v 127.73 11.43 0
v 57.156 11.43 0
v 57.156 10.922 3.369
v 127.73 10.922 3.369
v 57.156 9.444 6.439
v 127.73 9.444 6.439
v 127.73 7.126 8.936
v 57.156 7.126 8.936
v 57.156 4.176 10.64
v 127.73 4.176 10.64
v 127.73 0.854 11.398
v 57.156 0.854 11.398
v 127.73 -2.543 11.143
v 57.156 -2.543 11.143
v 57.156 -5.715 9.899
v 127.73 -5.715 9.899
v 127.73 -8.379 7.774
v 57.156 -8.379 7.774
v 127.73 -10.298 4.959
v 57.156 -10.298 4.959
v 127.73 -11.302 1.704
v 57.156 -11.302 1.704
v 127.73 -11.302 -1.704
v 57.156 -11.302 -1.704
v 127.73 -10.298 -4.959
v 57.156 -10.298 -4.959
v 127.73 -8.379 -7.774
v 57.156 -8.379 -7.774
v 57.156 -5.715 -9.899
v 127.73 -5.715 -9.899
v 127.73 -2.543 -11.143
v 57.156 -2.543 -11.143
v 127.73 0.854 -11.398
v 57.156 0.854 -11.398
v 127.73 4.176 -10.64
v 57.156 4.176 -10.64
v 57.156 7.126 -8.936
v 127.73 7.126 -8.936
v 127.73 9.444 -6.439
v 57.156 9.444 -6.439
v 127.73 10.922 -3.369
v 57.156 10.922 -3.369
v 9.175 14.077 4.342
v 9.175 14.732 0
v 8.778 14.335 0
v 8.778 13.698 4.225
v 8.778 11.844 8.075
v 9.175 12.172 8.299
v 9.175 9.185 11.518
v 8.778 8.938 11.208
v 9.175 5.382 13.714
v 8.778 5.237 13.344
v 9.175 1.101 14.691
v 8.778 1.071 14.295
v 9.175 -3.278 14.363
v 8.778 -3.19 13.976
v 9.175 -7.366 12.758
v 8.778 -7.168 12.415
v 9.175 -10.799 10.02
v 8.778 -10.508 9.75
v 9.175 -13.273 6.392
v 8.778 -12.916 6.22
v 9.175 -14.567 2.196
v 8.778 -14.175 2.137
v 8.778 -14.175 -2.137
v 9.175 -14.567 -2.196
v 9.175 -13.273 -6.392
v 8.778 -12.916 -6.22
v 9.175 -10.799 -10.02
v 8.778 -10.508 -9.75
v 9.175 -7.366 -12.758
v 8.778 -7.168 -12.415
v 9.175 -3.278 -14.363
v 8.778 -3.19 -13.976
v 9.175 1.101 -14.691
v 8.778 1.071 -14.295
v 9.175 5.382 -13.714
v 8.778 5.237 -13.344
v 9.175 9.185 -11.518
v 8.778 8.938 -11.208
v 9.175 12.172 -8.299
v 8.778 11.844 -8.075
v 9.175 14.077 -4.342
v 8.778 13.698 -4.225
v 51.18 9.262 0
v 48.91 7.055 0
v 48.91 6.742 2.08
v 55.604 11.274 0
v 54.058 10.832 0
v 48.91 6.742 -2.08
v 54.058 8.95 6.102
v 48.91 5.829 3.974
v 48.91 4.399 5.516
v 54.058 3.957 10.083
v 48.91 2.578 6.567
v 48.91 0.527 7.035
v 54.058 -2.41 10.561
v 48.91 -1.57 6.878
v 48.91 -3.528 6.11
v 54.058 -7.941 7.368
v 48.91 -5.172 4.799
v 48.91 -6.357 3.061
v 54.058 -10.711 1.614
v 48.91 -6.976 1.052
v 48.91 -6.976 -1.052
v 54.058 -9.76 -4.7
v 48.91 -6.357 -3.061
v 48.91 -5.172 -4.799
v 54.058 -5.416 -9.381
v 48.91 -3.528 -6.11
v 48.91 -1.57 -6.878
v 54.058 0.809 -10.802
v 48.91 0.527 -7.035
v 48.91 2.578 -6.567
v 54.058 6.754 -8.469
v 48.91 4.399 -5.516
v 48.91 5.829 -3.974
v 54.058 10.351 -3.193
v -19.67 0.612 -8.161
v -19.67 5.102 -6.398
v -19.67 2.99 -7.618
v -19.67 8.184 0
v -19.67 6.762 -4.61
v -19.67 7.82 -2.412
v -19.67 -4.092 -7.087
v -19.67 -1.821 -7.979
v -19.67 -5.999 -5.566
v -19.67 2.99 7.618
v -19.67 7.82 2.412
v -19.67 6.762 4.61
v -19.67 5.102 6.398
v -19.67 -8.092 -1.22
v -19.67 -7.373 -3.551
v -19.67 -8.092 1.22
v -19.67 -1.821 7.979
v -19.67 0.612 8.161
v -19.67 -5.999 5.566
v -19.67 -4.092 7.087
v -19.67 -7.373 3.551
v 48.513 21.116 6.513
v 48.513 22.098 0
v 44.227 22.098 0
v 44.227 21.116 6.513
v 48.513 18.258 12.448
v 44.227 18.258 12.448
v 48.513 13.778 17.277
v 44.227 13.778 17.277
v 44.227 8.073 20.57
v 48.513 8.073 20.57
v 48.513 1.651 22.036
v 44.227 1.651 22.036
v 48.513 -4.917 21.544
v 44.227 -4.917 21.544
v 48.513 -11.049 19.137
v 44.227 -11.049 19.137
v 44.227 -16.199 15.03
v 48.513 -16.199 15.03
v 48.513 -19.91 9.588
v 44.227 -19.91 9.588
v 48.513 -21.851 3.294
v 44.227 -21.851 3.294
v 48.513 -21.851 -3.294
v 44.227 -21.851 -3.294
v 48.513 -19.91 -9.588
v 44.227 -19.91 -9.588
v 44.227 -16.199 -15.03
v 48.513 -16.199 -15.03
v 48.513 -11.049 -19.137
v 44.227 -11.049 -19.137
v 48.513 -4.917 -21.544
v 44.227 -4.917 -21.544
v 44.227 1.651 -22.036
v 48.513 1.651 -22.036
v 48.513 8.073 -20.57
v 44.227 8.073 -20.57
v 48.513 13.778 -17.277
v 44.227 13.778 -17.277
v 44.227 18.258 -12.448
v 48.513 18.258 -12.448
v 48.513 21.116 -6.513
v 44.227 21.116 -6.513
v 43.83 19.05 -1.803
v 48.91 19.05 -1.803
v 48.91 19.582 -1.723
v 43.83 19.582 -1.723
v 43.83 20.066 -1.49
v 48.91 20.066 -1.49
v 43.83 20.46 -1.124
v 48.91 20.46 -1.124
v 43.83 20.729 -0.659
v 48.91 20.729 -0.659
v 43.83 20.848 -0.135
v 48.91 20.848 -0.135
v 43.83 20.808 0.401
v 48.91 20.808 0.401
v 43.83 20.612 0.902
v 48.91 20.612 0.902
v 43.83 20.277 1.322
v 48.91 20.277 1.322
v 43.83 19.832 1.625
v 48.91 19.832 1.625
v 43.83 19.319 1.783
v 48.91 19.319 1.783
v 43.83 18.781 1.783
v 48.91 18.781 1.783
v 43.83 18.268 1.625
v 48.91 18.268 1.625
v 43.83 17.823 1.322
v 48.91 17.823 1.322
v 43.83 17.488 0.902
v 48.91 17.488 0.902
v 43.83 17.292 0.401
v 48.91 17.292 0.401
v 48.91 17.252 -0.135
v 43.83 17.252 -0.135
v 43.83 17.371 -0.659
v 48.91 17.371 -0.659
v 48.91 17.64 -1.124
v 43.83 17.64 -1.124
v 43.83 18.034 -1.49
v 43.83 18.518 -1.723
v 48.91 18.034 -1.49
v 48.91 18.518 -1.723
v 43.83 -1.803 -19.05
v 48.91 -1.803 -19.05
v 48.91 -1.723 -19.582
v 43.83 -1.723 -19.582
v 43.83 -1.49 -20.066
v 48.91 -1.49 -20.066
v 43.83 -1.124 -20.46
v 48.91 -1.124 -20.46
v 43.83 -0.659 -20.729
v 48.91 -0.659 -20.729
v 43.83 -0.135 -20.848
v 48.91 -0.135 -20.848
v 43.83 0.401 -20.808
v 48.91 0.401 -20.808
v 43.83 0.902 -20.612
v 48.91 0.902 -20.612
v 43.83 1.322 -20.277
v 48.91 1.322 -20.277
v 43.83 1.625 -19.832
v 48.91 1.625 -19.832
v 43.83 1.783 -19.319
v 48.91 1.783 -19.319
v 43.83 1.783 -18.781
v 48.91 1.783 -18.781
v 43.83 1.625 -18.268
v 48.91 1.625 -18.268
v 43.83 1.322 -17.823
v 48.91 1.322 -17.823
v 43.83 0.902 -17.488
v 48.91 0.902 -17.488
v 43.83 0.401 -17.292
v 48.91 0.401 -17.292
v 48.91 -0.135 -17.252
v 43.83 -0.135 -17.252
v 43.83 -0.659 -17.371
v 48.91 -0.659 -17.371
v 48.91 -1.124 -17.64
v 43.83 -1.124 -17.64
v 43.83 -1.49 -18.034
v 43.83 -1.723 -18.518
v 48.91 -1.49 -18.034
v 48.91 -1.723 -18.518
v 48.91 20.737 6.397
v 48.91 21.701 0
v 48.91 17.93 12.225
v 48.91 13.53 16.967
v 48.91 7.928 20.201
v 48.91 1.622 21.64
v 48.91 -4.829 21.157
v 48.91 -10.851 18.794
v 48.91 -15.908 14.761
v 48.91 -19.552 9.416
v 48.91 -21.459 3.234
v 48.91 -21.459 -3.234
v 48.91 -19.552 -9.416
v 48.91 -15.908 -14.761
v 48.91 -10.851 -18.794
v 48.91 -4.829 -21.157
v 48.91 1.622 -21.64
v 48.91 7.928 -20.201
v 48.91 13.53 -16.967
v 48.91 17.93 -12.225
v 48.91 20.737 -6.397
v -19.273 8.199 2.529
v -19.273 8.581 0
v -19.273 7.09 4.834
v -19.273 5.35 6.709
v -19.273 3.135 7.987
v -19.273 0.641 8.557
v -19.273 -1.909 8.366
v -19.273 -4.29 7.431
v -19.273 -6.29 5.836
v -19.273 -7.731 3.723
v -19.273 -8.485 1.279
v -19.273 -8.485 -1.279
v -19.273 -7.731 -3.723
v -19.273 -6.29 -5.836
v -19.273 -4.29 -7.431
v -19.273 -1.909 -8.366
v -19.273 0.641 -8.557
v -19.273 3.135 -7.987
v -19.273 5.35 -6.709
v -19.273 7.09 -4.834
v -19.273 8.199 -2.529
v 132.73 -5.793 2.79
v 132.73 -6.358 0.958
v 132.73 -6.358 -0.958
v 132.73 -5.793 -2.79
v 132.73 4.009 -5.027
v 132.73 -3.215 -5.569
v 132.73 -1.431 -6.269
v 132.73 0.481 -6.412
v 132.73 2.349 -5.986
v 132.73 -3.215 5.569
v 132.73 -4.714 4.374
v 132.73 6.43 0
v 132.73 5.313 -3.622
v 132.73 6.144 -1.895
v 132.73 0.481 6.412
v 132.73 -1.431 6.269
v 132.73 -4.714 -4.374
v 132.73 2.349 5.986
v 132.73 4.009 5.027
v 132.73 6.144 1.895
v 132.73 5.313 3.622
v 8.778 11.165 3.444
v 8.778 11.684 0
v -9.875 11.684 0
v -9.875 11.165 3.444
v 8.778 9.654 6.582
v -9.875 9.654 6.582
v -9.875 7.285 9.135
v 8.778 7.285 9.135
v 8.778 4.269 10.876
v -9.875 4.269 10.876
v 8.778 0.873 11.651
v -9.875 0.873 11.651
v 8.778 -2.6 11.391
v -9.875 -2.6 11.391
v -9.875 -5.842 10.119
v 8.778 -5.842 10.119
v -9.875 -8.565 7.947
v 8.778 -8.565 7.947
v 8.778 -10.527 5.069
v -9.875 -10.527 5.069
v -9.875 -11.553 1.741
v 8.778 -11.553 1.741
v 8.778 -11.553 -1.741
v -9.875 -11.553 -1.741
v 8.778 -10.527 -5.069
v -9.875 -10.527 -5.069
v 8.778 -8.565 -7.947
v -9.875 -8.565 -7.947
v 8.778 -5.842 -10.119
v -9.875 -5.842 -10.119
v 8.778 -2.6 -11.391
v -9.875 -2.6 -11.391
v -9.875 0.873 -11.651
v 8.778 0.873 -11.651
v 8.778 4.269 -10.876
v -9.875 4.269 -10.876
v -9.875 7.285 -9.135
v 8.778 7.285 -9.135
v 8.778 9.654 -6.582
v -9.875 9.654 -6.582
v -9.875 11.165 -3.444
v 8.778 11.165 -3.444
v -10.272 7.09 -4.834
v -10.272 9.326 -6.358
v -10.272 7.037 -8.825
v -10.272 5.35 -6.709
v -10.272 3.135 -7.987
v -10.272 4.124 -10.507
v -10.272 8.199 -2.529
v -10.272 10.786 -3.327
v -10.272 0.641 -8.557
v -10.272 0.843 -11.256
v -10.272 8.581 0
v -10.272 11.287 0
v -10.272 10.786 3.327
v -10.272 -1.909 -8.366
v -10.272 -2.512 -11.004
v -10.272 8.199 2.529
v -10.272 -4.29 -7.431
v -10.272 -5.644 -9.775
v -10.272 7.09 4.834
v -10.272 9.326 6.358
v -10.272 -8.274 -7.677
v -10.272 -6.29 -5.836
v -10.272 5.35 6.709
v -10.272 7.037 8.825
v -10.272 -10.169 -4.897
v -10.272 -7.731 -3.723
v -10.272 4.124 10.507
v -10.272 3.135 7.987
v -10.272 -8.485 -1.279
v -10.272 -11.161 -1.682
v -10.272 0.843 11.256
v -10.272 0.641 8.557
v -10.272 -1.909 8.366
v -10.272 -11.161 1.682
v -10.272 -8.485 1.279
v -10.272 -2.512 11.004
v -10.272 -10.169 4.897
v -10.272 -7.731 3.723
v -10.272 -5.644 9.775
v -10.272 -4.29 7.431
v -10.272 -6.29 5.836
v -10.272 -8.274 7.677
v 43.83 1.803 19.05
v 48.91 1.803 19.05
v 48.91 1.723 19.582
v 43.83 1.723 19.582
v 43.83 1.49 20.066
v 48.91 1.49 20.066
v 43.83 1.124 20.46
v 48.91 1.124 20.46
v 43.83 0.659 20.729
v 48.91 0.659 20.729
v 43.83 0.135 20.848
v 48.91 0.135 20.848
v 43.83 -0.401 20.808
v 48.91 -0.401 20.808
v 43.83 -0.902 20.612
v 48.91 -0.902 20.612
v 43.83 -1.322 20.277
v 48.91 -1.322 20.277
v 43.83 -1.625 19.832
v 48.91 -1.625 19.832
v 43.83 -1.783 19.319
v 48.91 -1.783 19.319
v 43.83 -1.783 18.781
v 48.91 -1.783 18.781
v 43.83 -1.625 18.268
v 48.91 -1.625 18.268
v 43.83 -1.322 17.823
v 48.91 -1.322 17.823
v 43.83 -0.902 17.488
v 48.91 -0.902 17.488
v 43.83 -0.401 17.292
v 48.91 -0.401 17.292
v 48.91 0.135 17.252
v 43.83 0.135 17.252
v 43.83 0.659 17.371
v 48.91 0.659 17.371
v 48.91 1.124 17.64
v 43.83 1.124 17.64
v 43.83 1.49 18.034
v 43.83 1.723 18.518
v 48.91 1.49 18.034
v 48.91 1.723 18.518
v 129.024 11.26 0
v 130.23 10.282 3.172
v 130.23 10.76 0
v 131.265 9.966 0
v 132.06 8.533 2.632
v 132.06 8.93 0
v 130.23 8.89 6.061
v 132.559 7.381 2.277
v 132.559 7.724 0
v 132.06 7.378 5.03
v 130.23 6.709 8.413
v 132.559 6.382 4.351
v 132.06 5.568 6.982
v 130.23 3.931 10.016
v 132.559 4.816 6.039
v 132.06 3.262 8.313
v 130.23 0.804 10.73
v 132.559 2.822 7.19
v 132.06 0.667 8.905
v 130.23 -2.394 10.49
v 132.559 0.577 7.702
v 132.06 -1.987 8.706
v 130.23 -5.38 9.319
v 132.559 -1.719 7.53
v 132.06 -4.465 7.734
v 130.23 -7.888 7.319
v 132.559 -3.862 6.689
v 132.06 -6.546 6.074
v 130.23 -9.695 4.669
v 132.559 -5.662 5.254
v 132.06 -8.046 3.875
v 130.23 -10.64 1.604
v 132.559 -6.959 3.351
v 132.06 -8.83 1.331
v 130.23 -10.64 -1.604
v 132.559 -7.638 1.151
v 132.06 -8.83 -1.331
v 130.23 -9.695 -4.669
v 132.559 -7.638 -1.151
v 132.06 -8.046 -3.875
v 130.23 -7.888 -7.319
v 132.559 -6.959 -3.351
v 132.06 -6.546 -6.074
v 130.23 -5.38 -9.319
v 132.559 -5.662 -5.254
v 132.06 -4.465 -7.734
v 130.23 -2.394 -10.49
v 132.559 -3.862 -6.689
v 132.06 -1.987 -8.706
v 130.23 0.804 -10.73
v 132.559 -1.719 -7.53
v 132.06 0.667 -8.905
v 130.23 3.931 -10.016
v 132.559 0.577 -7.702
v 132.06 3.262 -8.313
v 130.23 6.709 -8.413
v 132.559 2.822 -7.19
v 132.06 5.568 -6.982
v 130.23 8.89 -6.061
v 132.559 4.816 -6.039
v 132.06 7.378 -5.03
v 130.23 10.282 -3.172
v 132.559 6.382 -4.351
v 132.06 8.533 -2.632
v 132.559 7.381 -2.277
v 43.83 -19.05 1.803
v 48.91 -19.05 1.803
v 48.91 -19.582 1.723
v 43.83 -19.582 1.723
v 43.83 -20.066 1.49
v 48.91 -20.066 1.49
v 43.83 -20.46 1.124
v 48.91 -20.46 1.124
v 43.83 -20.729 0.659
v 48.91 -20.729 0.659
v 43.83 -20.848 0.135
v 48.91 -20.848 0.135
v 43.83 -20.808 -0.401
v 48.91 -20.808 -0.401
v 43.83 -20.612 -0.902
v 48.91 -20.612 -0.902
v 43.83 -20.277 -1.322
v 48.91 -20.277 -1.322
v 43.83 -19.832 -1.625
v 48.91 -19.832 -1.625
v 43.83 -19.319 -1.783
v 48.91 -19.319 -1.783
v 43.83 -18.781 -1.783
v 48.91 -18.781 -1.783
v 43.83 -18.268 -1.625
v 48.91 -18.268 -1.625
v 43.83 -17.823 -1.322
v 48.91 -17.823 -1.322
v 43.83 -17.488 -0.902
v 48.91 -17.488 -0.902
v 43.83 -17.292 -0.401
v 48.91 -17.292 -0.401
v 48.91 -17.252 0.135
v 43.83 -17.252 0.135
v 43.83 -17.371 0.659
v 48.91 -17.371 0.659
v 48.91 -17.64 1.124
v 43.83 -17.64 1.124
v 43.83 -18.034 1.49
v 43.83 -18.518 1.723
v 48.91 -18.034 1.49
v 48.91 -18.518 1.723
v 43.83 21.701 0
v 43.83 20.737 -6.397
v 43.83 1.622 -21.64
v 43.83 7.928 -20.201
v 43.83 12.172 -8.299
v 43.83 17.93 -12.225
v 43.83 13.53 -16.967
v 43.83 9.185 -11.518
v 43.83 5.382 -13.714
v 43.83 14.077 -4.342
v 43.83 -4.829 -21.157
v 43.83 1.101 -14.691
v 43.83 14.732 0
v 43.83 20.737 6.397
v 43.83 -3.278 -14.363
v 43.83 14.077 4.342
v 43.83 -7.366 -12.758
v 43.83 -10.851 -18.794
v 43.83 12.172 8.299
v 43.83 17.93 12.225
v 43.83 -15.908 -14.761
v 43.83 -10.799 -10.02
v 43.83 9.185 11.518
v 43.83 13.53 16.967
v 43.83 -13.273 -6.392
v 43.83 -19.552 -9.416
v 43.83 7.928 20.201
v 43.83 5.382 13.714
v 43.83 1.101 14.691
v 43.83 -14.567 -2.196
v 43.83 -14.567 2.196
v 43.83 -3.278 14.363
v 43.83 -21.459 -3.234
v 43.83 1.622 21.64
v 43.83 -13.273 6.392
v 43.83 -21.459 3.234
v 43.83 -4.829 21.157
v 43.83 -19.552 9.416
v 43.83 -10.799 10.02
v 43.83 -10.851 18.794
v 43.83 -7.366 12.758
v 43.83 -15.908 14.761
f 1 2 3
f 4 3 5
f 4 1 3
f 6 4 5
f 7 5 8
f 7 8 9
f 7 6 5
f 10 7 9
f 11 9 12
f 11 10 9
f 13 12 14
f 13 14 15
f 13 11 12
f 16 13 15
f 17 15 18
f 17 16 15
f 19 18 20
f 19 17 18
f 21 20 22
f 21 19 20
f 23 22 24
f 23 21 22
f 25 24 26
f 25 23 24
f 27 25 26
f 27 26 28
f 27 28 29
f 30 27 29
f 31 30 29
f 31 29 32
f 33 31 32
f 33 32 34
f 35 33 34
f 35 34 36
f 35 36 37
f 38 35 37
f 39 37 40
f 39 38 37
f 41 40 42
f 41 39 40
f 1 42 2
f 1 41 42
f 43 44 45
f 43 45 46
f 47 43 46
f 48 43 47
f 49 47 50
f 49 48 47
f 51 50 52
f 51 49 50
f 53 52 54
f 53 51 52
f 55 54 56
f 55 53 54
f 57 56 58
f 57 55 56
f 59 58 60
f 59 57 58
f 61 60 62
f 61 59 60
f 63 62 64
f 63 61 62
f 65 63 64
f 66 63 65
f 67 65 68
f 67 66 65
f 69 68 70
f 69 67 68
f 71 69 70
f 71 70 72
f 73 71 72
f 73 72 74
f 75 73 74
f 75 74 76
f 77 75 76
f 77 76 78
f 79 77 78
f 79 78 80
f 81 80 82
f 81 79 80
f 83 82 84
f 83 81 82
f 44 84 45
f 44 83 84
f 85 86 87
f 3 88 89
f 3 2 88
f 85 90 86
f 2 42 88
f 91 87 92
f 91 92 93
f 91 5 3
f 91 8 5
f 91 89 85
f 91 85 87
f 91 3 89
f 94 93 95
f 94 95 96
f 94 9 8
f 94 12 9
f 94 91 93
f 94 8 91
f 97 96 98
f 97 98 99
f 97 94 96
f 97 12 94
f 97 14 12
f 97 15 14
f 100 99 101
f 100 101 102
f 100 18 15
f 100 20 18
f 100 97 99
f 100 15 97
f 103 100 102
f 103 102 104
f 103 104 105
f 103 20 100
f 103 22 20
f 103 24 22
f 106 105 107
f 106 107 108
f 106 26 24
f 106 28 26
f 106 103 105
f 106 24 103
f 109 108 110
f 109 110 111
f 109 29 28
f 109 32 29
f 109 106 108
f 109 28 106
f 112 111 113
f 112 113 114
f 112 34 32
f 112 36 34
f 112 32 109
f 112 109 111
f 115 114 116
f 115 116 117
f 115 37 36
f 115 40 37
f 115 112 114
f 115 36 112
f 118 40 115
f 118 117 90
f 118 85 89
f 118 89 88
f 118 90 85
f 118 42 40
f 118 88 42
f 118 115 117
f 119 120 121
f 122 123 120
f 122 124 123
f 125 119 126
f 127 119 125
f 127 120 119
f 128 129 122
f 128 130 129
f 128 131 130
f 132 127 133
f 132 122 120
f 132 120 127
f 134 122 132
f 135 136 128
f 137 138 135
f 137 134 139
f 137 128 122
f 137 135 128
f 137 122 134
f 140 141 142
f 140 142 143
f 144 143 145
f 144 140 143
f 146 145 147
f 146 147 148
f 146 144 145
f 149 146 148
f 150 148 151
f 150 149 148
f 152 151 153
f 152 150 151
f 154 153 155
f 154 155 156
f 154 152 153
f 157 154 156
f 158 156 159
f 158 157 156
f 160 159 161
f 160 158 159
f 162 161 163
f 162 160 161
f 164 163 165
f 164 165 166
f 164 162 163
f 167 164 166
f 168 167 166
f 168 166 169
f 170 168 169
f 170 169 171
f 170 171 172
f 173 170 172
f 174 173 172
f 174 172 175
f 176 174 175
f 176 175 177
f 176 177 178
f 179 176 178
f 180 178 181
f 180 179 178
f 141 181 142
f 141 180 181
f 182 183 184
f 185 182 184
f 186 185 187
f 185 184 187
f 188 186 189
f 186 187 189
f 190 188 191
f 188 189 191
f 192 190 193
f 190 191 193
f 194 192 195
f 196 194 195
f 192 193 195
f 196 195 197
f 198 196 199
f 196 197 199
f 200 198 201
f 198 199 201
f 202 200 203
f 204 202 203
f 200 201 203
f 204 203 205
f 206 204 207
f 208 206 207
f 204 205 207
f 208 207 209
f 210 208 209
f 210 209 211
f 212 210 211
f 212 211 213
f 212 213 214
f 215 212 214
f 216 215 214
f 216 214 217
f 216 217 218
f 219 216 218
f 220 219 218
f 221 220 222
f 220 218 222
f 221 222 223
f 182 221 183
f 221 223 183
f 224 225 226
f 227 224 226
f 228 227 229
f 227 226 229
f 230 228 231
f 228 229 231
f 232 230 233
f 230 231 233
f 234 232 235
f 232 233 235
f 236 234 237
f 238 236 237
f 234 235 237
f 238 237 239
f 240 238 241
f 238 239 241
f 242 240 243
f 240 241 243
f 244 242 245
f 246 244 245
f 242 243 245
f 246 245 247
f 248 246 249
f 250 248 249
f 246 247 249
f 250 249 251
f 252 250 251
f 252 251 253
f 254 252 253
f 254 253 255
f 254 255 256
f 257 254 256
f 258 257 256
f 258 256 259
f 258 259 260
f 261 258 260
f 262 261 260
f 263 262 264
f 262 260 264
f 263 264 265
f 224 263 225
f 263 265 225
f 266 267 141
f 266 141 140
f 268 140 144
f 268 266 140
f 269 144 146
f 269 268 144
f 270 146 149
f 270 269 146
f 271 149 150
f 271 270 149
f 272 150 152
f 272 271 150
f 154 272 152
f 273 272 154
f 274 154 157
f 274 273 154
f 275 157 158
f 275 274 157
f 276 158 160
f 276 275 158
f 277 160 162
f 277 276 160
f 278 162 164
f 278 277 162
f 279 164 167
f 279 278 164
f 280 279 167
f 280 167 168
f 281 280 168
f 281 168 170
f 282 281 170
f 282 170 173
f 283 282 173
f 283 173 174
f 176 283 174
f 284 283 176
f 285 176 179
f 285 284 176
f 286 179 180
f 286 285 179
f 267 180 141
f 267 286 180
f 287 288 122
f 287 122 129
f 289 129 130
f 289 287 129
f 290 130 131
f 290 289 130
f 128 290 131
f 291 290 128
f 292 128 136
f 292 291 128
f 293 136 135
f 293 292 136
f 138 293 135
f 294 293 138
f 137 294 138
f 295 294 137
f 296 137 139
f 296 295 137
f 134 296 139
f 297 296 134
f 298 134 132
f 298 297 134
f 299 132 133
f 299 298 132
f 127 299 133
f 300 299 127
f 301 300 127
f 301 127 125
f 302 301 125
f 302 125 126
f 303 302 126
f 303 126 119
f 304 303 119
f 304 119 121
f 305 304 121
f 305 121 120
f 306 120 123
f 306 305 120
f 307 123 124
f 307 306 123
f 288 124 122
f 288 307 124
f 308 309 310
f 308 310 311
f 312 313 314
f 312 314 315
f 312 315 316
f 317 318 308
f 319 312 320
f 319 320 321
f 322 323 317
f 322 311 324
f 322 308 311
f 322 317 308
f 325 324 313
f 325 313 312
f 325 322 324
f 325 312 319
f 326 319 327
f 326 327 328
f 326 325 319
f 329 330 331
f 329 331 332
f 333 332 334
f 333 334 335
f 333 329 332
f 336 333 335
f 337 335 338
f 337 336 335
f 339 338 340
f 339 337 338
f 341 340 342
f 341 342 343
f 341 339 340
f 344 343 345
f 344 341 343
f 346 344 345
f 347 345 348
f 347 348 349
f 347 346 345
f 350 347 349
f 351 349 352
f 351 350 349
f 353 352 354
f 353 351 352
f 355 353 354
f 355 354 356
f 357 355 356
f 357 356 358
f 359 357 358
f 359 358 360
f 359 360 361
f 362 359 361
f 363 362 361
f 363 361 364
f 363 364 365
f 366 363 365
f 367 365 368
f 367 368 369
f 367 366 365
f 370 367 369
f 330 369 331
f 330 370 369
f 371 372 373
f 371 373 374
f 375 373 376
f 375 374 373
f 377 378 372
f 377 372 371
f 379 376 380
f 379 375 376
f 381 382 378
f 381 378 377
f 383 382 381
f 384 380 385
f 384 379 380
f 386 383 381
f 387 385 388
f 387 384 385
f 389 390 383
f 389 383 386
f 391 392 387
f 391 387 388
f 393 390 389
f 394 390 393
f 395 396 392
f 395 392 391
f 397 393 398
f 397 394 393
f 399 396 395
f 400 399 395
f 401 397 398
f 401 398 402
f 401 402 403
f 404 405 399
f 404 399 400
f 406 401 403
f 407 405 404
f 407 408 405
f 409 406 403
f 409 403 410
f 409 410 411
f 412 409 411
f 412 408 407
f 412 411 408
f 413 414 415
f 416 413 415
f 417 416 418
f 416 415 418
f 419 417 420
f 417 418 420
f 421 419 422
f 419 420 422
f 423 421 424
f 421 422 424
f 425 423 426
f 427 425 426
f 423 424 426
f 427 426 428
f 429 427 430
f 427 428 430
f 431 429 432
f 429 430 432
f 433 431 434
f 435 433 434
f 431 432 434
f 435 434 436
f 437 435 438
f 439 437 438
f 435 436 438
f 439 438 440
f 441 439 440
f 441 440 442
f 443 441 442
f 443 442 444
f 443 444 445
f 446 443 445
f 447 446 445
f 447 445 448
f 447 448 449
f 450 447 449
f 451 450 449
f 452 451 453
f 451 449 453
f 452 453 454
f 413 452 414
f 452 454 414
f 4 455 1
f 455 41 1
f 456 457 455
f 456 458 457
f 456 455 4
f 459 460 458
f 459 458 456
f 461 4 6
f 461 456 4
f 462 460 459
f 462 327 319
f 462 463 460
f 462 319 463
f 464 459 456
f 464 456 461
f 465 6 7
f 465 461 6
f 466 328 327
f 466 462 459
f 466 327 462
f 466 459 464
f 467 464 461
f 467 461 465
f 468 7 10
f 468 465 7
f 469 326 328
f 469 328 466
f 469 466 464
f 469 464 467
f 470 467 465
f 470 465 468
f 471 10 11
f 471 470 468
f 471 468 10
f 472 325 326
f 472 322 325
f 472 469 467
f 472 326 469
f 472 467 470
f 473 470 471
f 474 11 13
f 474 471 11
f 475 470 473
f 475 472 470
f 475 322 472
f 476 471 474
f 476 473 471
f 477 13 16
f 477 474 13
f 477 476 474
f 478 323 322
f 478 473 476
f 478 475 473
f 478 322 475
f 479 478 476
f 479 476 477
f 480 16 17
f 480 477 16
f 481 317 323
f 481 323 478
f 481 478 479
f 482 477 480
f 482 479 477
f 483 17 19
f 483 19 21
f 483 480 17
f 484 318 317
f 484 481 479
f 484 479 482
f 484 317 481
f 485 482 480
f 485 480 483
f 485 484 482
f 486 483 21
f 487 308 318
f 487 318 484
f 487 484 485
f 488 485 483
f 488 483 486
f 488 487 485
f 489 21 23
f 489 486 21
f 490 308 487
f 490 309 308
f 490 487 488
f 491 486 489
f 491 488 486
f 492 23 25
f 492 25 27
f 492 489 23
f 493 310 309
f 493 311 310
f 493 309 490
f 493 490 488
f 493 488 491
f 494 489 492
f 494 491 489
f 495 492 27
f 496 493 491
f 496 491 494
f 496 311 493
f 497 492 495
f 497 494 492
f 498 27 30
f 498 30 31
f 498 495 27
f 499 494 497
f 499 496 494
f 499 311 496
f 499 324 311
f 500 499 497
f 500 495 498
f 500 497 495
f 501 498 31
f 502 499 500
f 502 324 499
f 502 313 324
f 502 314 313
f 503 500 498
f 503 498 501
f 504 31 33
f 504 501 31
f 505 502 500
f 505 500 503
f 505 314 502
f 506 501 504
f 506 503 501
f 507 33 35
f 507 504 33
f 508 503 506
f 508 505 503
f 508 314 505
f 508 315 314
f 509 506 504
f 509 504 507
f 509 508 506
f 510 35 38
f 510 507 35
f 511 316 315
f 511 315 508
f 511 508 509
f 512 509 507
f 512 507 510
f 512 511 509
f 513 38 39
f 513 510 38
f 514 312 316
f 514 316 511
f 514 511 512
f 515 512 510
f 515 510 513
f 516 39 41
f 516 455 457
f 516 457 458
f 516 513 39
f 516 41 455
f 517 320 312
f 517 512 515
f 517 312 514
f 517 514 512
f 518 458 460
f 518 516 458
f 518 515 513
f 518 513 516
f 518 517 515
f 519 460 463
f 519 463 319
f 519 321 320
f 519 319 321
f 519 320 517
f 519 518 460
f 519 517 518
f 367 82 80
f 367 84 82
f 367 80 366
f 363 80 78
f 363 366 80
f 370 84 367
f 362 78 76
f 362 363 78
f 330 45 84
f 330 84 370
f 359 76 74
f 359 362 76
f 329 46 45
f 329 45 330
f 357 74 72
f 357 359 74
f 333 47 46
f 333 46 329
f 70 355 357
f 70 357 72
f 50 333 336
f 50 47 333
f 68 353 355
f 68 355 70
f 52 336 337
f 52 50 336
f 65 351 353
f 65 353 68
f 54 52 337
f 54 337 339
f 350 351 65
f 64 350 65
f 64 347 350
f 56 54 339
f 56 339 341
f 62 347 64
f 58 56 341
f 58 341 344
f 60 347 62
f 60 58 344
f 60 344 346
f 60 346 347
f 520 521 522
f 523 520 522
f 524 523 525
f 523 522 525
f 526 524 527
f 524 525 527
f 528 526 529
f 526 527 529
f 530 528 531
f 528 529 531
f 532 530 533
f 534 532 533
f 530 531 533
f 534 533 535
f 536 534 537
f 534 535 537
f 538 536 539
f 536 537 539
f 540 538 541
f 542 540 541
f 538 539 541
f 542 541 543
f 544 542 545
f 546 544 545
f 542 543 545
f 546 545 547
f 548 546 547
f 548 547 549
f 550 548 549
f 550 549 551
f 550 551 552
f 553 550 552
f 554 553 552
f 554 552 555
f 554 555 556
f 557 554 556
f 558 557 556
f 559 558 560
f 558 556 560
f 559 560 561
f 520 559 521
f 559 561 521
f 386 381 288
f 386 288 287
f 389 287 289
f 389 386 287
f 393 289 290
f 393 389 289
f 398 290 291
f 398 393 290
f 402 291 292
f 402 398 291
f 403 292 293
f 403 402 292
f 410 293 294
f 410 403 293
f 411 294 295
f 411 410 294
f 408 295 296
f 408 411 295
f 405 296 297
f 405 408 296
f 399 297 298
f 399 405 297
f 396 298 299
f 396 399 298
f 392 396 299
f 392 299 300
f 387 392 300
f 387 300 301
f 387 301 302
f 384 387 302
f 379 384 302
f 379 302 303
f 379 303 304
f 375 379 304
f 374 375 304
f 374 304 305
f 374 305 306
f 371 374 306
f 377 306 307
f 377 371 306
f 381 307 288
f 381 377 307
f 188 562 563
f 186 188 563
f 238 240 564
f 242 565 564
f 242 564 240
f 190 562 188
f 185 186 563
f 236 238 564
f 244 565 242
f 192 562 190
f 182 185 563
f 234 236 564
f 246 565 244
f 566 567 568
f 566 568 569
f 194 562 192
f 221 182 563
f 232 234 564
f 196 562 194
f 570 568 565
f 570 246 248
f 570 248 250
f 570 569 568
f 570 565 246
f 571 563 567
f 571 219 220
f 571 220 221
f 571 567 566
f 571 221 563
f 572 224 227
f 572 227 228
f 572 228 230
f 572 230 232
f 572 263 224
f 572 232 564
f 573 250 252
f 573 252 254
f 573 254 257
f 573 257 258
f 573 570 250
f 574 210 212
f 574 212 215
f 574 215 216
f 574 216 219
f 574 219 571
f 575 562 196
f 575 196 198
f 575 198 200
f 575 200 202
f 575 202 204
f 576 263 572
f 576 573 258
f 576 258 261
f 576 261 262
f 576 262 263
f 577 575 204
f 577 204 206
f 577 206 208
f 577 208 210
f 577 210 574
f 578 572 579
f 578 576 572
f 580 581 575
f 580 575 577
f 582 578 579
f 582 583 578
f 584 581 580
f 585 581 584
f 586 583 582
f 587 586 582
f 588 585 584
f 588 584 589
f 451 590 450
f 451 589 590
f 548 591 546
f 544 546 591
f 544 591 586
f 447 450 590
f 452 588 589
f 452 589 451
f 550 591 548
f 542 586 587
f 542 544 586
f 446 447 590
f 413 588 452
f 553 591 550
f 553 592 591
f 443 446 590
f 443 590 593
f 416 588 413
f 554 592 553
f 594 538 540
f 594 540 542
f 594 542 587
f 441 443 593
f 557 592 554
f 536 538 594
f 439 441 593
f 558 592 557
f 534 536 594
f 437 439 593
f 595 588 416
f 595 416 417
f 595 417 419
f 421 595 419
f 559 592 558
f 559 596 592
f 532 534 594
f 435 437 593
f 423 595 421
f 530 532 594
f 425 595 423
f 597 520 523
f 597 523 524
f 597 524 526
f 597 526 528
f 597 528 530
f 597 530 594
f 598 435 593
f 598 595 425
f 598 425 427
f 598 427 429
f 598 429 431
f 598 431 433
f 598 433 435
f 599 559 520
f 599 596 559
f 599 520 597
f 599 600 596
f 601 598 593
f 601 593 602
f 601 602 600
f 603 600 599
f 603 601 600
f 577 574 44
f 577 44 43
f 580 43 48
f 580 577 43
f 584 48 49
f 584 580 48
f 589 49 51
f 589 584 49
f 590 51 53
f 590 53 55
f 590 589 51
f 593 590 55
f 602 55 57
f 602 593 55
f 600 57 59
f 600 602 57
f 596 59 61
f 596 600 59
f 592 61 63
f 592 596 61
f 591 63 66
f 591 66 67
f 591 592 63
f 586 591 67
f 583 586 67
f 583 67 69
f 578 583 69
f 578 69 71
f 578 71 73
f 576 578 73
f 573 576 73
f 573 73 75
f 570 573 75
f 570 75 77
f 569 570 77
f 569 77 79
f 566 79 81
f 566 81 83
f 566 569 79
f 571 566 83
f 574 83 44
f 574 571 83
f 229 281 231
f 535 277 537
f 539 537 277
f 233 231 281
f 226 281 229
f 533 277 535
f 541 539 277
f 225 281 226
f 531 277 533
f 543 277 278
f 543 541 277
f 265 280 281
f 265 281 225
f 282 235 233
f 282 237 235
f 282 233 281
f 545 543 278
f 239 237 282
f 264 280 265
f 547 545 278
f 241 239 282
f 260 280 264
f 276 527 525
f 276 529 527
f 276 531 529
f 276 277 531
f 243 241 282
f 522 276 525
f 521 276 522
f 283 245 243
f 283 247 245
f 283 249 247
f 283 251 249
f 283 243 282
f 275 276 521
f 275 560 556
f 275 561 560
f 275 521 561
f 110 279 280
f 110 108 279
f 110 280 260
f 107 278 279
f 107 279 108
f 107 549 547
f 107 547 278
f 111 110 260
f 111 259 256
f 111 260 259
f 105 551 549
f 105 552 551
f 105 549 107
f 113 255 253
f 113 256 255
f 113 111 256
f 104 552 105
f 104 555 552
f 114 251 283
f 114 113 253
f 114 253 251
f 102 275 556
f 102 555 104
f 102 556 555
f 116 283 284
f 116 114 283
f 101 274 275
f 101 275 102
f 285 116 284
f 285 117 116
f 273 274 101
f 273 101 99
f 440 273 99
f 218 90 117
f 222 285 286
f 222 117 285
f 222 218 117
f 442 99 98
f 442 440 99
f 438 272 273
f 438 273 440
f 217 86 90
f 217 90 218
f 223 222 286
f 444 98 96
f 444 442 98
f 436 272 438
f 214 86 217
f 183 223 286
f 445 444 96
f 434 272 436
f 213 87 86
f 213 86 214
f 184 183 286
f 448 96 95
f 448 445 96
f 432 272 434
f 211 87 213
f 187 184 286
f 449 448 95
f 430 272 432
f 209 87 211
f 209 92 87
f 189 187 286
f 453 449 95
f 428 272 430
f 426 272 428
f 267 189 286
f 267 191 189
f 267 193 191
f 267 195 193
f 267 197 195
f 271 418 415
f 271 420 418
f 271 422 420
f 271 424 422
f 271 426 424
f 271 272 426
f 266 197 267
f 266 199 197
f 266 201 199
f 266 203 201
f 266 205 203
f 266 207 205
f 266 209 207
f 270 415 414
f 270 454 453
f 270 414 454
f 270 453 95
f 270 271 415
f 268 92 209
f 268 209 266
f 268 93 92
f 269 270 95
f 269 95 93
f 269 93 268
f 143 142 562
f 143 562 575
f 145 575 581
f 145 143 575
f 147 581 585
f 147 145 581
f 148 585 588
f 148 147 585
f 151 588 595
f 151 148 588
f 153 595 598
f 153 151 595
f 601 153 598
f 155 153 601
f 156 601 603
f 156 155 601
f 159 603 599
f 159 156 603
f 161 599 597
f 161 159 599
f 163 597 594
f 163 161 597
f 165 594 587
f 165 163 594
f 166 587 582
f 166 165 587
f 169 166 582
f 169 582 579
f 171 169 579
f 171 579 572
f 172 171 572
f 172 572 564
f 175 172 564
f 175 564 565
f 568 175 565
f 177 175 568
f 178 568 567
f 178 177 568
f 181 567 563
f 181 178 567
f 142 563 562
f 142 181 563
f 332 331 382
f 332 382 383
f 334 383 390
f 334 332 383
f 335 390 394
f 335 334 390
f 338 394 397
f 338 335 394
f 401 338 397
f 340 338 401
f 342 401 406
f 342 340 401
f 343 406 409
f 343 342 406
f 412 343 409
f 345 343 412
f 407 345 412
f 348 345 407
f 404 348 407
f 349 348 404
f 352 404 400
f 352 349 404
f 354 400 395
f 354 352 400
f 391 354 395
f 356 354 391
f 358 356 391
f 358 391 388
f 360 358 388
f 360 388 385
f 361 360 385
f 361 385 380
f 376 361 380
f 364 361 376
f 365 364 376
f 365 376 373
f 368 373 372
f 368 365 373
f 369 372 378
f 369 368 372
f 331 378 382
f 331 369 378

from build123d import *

# Parameters (mm, degrees)
SKETCH2_R          = 1.8034
CUT_EXTRUDE1_DEPTH = 5.08
CIRPATTERN2_COUNT  = 4
CHAMFER1_SIZE      = 0.396875


with BuildPart() as part:
    # Sketch1 → Revolve1 (revolve)
    with BuildSketch(Plane.XY):
        with BuildLine():
            Line((-19.670349573, 0), (-19.670349573, 8.580640426))
            Line((-19.670349573, 8.580640426), (-10.272349573, 8.580640426))
            Line((-10.272349573, 8.580640426), (-10.272349573, 11.684))
            Line((-10.272349573, 11.684), (8.777650427, 11.684))
            Line((8.777650427, 11.684), (8.777650427, 14.732))
            Line((8.777650427, 14.732), (43.829650427, 14.732))
            Line((43.829650427, 14.732), (43.829650427, 22.098))
            Line((43.829650427, 22.098), (48.909650427, 22.098))
            Line((48.909650427, 22.098), (48.909650427, 7.055193239))
            add(Edge.make_bspline(
                [(48.909650427, 7.055193239), (50.745745469, 9.469407322), (54.078310122, 11.43), (57.155980429, 11.43)],
                knots=[0, 0, 0, 0, 1, 1, 1, 1], degree=3))
            Line((57.155980429, 11.43), (127.729650427, 11.43))
            ThreePointArc((127.729650427, 11.43), (131.265184333, 9.965533906), (132.729650427, 6.43))
            Line((132.729650427, 6.43), (132.729650427, 0))
            Line((132.729650427, 0), (-19.670349573, 0))
        make_face()
    revolve(axis=Axis((-19.670349573, 0, 0), (1, 0, 0)))

    # Sketch2 → Cut-Extrude1 (cut)
    with BuildSketch(Plane(origin=(48.909650427, 0, 0), x_dir=(0, 0, -1), z_dir=(1, 0, 0))):
        with Locations((0, 19.05)):
            Circle(SKETCH2_R)
    cut_extrude1 = extrude(amount=-CUT_EXTRUDE1_DEPTH, mode=Mode.SUBTRACT)

    # CirPattern2: Cut-Extrude1 ×4 about axis
    cirpattern2_axis = Axis((0, 0, 0), (1, 0, 0))
    for i in range(1, CIRPATTERN2_COUNT):
        add(cut_extrude1.rotate(cirpattern2_axis, i * 360 / CIRPATTERN2_COUNT), mode=Mode.SUBTRACT)

    # Chamfer1
    chamfer1_edges = [part.edges().sort_by_distance(p)[0] for p in [
        (48.909650427, -22.098, 0),
        (43.829650427, -22.098, 0),
        (8.777650427, -14.732, 0),
        (-10.272349573, -11.684, 0),
        (-19.670349573, -8.580640426, 0),
    ]]
    chamfer(chamfer1_edges, length=CHAMFER1_SIZE)


solid = part.part
